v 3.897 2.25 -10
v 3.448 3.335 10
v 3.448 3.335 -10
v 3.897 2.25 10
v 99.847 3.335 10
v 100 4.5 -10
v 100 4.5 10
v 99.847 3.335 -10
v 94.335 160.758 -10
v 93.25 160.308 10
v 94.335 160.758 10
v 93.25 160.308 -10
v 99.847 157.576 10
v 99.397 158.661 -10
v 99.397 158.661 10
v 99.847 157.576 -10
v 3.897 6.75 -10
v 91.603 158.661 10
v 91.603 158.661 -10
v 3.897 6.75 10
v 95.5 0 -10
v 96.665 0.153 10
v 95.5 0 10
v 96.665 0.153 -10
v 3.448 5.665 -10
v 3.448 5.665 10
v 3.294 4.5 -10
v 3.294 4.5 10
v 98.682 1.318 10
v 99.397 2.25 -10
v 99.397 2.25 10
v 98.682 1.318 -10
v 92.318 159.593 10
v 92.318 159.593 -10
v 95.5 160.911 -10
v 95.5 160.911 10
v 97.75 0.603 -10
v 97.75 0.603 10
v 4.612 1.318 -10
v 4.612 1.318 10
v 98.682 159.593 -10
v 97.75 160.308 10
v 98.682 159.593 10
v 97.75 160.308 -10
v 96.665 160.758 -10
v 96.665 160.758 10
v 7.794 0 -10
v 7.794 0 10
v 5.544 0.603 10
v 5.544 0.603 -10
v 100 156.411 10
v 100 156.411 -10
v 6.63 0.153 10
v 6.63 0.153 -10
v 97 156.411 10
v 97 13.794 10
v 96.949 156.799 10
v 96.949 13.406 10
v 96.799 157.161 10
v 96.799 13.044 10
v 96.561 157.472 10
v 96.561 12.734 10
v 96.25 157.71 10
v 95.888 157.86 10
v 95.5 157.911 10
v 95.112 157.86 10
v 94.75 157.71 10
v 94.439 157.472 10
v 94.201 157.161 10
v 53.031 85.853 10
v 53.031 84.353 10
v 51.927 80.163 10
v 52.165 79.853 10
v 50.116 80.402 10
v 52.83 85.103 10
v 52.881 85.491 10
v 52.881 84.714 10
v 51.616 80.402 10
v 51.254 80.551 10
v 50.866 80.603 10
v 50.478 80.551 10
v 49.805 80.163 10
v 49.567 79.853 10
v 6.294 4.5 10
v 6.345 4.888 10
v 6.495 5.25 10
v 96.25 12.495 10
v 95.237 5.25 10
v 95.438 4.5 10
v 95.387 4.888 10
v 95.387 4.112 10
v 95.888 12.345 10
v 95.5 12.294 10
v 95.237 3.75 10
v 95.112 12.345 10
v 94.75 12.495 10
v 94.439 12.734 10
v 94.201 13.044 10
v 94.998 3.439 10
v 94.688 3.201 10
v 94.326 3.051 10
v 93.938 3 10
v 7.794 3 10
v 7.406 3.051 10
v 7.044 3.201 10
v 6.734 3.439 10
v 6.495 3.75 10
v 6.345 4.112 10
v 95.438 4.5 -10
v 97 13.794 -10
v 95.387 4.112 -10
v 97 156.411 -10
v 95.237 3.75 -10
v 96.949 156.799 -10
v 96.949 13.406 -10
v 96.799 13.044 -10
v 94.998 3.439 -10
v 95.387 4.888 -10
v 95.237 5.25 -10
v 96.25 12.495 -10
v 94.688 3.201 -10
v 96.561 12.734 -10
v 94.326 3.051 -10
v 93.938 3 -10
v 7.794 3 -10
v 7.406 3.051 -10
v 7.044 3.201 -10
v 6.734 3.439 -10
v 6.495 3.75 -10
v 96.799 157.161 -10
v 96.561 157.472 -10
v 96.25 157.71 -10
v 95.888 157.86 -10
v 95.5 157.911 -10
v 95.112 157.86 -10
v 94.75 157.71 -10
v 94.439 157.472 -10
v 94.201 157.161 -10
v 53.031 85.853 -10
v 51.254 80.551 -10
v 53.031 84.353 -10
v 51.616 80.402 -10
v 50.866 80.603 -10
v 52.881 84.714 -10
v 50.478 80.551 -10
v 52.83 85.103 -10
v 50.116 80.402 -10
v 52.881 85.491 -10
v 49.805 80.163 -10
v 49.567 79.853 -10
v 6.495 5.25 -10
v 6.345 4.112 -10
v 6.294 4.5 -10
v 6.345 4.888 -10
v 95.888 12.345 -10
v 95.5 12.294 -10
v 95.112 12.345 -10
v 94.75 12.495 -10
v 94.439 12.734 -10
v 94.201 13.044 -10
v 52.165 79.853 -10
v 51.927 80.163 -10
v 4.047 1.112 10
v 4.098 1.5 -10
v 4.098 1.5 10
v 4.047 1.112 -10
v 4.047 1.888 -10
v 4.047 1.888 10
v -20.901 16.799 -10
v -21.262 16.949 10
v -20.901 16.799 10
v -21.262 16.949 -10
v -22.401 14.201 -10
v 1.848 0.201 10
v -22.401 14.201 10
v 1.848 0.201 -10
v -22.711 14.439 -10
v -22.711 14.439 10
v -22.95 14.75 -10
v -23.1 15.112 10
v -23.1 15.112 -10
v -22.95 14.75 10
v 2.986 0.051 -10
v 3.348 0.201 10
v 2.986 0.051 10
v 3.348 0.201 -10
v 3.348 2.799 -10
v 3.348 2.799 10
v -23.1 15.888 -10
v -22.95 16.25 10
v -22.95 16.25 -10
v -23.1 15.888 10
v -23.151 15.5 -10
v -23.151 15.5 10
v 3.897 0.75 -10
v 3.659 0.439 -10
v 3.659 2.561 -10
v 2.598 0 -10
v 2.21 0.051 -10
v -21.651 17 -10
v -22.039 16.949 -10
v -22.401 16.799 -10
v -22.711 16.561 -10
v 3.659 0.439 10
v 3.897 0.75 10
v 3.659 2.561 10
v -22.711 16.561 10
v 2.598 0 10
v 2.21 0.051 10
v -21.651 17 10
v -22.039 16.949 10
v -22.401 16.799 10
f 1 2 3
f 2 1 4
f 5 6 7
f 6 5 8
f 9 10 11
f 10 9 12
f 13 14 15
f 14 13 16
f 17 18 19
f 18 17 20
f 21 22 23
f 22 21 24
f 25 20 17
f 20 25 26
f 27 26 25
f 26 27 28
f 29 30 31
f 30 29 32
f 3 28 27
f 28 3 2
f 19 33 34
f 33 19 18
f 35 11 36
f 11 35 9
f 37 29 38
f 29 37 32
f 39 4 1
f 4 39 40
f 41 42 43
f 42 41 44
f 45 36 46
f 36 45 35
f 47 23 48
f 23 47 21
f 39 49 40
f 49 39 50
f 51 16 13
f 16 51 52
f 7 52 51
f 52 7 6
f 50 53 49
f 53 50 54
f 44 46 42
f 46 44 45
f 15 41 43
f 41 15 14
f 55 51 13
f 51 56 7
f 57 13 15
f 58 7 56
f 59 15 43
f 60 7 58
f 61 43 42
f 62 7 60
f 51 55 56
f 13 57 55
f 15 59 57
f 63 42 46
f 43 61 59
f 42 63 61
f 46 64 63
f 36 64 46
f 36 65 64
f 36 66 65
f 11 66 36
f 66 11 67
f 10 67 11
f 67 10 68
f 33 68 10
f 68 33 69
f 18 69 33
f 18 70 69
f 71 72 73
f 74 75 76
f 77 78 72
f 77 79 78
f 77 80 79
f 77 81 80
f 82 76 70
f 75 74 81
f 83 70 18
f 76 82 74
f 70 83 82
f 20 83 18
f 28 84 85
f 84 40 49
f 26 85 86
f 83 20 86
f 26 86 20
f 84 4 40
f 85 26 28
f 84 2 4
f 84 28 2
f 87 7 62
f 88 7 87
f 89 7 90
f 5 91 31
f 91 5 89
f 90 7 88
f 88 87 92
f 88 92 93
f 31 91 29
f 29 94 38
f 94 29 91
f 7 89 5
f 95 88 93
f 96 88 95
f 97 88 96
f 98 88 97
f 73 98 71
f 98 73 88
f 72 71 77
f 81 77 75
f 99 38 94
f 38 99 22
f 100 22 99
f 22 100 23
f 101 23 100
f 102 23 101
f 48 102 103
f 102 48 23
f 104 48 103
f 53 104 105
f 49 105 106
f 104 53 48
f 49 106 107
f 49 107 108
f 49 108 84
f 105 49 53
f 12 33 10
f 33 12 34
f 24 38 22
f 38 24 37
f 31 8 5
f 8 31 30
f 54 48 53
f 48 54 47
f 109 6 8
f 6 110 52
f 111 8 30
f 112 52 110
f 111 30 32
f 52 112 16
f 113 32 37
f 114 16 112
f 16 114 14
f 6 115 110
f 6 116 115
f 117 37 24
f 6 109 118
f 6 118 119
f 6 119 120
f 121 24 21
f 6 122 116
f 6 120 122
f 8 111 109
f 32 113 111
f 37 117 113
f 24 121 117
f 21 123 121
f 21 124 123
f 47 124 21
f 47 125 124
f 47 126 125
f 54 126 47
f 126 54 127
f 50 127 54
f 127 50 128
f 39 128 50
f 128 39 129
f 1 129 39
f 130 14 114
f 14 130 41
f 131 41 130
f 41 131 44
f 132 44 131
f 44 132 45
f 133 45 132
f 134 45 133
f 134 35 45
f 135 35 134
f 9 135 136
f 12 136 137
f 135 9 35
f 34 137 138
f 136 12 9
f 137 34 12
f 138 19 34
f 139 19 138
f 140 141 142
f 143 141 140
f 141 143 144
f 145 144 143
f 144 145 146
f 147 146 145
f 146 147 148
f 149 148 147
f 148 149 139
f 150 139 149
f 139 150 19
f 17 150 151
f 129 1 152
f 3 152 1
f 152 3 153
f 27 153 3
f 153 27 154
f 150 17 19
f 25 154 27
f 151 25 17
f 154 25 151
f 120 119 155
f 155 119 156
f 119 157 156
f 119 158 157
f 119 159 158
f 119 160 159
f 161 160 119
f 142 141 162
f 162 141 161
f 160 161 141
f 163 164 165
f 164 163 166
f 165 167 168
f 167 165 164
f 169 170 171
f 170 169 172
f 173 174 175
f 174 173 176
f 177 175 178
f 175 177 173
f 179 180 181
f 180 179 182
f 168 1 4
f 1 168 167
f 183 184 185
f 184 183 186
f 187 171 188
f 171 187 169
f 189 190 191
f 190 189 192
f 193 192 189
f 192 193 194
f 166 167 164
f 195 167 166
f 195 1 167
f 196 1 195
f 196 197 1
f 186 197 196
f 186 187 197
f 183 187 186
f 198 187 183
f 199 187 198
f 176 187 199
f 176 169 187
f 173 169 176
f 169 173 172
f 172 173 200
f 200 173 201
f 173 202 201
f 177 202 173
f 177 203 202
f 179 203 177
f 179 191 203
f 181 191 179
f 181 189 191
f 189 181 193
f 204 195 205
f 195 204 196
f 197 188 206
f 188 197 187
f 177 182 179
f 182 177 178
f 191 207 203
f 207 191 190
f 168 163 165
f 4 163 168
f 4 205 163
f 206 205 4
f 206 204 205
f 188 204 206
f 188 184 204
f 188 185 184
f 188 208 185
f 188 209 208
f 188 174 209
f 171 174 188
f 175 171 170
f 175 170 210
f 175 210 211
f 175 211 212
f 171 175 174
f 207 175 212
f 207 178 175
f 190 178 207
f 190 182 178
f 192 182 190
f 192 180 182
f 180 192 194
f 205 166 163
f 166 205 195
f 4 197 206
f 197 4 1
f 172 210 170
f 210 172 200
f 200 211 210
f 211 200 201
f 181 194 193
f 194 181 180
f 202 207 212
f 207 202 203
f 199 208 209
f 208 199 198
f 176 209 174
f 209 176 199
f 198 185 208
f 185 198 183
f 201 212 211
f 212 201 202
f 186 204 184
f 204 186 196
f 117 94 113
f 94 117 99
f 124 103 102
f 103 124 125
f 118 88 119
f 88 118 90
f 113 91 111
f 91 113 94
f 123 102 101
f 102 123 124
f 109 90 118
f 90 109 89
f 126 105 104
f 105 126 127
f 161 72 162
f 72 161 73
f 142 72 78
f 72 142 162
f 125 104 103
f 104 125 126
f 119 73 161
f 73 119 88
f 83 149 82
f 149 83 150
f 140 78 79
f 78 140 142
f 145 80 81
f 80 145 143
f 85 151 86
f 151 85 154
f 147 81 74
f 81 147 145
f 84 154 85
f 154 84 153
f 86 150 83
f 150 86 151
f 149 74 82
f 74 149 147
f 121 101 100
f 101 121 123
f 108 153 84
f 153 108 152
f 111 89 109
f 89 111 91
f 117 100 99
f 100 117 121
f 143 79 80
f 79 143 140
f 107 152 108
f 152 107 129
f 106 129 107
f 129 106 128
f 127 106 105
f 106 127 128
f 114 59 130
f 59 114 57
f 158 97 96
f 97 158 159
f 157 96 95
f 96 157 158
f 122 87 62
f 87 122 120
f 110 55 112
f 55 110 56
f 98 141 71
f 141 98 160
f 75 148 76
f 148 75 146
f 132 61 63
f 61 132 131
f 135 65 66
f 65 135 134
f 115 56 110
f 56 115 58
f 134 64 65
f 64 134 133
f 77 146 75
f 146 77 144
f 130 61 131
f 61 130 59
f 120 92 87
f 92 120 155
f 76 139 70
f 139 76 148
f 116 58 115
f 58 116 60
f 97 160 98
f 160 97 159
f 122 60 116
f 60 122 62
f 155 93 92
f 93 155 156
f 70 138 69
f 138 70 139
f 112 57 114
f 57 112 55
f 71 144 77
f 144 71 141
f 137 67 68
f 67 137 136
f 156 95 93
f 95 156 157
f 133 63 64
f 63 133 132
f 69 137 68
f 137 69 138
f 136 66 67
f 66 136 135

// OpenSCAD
// Configurable laptop stand

// Copyright (C) 2017 Embecosm Limited (www.embecosm.com)

// Contributor: Jeremy Bennett <jeremy.bennett@embecosm.com>

// This file is licensed under the Creative Commons Attribution-ShareAlike 3.0
// Unported License. To view a copy of this license, visit
// http://creativecommons.org/licenses/by-sa/3.0/ or send a letter to Creative
// Commons, PO Box 1866, Mountain View, CA 94042, USA.


// General overlap value

DELTA  = 0.05;
DELTA2 = DELTA * 2;

// Measure the laptop thickness from the desk to the flat with the laptop
// open.

LAPTOP_T = 22;

// Thickness of the wall

T = 3.0;

// Degree of rounding of the inner edges

INNER_R = 1.5;

// Degree of rounding of the outer edges

OUTER_R = INNER_R + T;

// Angle of the stand, plus it opposite angle

A = 60.0;
B = 90.0 - A;

// Breadth of the stand, which since we are printing on our side is the height
// of the print.

H = 20;

// Length of the face.  This is the longest part of the stand, so limited by
// the printer.

F = 200.0;

// Other edges, base and back

BASE = F * cos (A);
BACK = F * sin (A);

// General
// -------

// Vertical lines are represented as vectors [TRUE, x_intercept]
// All other lines are represented as vectors [FALSE, m, c]
// Points are represented as vectors [x ,y, z]

// Note: We could more compactly represent vertical lines as scalars and use
//       vectors for all other lines, relying on len () which returns undef on
//       scalars to distinguish them. However our approach provides an element
//       of redundancy which can be helpful.


// Function to report if a line is vertical

function isvert (l) =
     l[0];


// Function to report if a line is horizontal

function ishoriz (l) =
     (!isvert (l)) && (l[1] == 0);


// Function to compute intersection of 2 lines, neither of which is vertical

//   y = m1 * x + c1
//   y = m2 * x + c2

// Equating the two we get

//   m1 * x + c1 = m2 * x + c2
//   (m1 - m2) * x = c2 - c1
//   x = (c2 - c1) / (m1 - m2)

//   y = m1 * (c2 - c1) / (m1 - m2) + c1

// We return a point [x, y], where x and y are both UNDEF if the lines are
// parallel.

function intersect1 (l1, l2) =
     let (m1 = l1[1], c1 = l1[2], m2 = l2[1], c2 = l2[2])
     (m1 == m2) ? [undef, undef, 0]
                : [(c2 - c1) / (m1 - m2), m1 * (c2 - c1) / (m1 - m2) + c1, 0];


// Function to computer intersection of 2 lines where one is vertical

//   y = m * x + c
//   x = k

// Equating the two we can solve for y

//   y = m * k + c

// Note that the second line is always the vertical one

// We return a pint [x, y, 0]

function intersect2 (l1, l2) =
     let (m = l1[1], c = l1[2], k = l2[1])
     [k, m * k + c, 0];


// Function to compute intersection of 2 lines, one of which may be vertical

// Returns a point [x,y], where x and y are both UNDEF if we are asked for the
// intersection of two vertical lines.

function intersect (l1, l2) =
     (isvert (l1) ? (isvert (l2) ? [undef, undef] : intersect2 (l2, l1))
                  : (isvert (l2) ? intersect2 (l1, l2) : intersect1 (l1, l2)));


// Function to compute the equation of a non-vertical parallel line

// Given y = m * x + c

// The line r above (below if r is negative) has the equation

//   y = m * x + c + r * sqrt (1 + m^2)

// We return the line [FALSE, m, c + r * sqrt (1 + m^2)]

function parallel_line1 (l, r) =
     let (m = l[1], c = l[2])
     [false, m, c + r * sqrt (1 + m * m)];


// Function to compute the equation of a vertical parallel line

// Given x = k

// The line r to the right left if r is negative) has the equation

//   x = k + r;

// We return the line [TRUE, k + r]

function parallel_line2 (l, r) =
     let (k = l[1])
     [true, k + r];


// Function to compute the equation of a parallel line

// This function works for vertical and non-vertical lines

// We return the parallel line

function parallel_line (l, r) =
     (isvert (l) ? parallel_line2 (l, r) : parallel_line1 (l, r));


// Function to compute a perpendicular line which passes through a point,
// where neither the original line, nor the resulting one are vertical.

// Let the originating line be:

//    y = m * x + c

// and the point of intersection be (x1, y1)

// The gradient of the resulting line, m' = -1/m
// The intercept, c' = y1 + x1 / m

// Return the resulting line [FALSE, m', c']

function perpendicular_line1 (l, p) =
     let (m = l[1], c = l[2], x1 = p[0], y1 = p [1])
     [false, -1 / m, y1 + x1 / m];


// Function to compute a perpendicular line which passes through a point where
// the original line is vertical.

// Let the originating line be:

//    x = k

// and the point of intersection be (x1, y1)

// The gradient of the resulting line, m' = 0
// The intercept, c' = y1

// Return the resulting line [FALSE, m', c']

function perpendicular_line2 (l, p) =
     let (y1 = p[1])
     [false, 0, y1];


// Function to compute a perpendicular line which passes through a point where
// the resulting line is vertical.

// Let the originating line be:

//    y = c

// and the point of intersection be (x1, y1)

// The x-intercept of the resulting line, k = x1

// Return the resulting line [TRUE, k]

function perpendicular_line3 (l, p) =
     let (x1 = p[0])
     [true, x1];


// Function to compute a perpendicular line which passes through a point

// We have to deal with the special cases where either the starting line or
// the resulting line may be vertical

// We return the resulting line

function perpendicular_line (l, p) =
     (isvert (l) ? perpendicular_line2 (l, p)
                 : (ishoriz (l) ? perpendicular_line3 (l, p)
                                : perpendicular_line1 (l, p)));


// Function to return the mid point between two points

// Return the resulting mid-point

function mid_point (p1, p2) =
     [(p1[0] + p2[0]) / 2, (p1[1] + p2[1]) / 2, (p1[2] + p2[2]) / 2];


// Function to return the non-vertical line which passes between two points.

// For now z is ignored.

// Return the resulting line

function join_line1 (p1, p2) =
     let (x1 = p1[0], x2 = p2[0], y1 = p1[1], y2 = p2[1],
	  m = (y2 - y1) / (x2 - x1), c = y1 - m * x1)
     [false, m, c];


// Function to return the vertical line which passes between two points.

// For now z is ignored.

// Return the resulting line

function join_line2 (p1, p2) =
     let (x1 = p1[0])
     [true, x1];


// Function to return the line which passes between two points.

// For now z is ignored. Split into vertical and non-vertical cases

// Return the resulting line

function join_line (p1, p2) =
     ((p1[0] != p2[0]) ? join_line1 (p1, p2) : join_line2 (p1, p2));


// The lines which outline the stand

//   Face:  y = tan (A) * x + 0  ([FALSE, tan (A), 0])
//   Base:  y = 0                ([FALSE, 0, 0])
//   Back:  x = F * cos (A)      ([TRUE, F * cos (A)])

face_line = [false, tan (A), 0];
base_line = [false, 0, 0];
back_line = [true, F * cos (A)];


// The diagonal goes from halfway along the face to the meeting point of the
// back and base.

mid_line = join_line (mid_point (intersect (back_line, face_line),
				 intersect (face_line, base_line)),
		      intersect (base_line, back_line));


// Block outline of main stand part.

// We use the intersections of OUTER_R inside the main outline:

//   Inside face by w:     y = tan (A) * x - w / cos A
//   Inside base by w:     y = w
//   Inside back by w:     x = F * cos (A) - w

// where w = OUTER_R

// We then add the lip, which is at right angles from the forward bottom
// corner.

module main_block () {
     w = OUTER_R;
     l1 = parallel_line (base_line, w);
     l2 = parallel_line (face_line, -w);
     l3 = parallel_line (back_line, -w);

     hull () {

	  // Main triangle

	  translate (v = intersect (l1, l2))
	       cylinder (r = w, h = H, center = true, $fn = 24);
	  translate (v = intersect (l2, l3))
	       cylinder (r = w, h = H, center = true, $fn = 24);
	  translate (v = intersect (l3, l1))
	       cylinder (r = w, h = H, center = true, $fn = 24);

	  // Lip
     }
}


// Lower hole

module lo_hole () {
     w1 = OUTER_R;
     w2 = INNER_R;
     h = H + DELTA;
     l1 = parallel_line (base_line, w1);
     l2 = parallel_line (face_line, -w1);
     l3 = parallel_line (mid_line,  -(T/2 + w2));
     hull () {
	  translate (v = intersect (l1, l2))
	       cylinder (r = w2, h = h, center = true, $fn = 24);
	  translate (v = intersect (l2, l3))
	       cylinder (r = w2, h = h, center = true, $fn = 24);
	  translate (v = intersect (l3, l1))
	       cylinder (r = w2, h = h, center = true, $fn = 24);
     }
}


// Upper hole

module hi_hole () {
     w1 = OUTER_R;
     w2 = INNER_R;
     h = H + DELTA;
     l1 = parallel_line (back_line, -w1);
     l2 = parallel_line (face_line, -w1);
     l3 = parallel_line (mid_line, T/2 + w2);
     hull () {
	  translate (v = intersect (l1, l2))
	       cylinder (r = w2, h = h, center = true, $fn = 24);
	  translate (v = intersect (l2, l3))
	       cylinder (r = w2, h = h, center = true, $fn = 24);
	  translate (v = intersect (l3, l1))
	       cylinder (r = w2, h = h, center = true, $fn = 24);
     }
}


// The lip

module lip () {
     w1 = T/2;
     w2 = LAPTOP_T + T;
     l1 = parallel_line (base_line, w1);
     l2 = parallel_line (face_line, -w1);
     l3 = perpendicular_line (face_line, intersect (l1, l2));
     l4 = parallel_line (face_line, w1 + w2);
     hull () {
	  translate (v = intersect (l1, l2))
	       cylinder (r = w1, h = H, center = true, $fn = 24);
	  translate (v = intersect (l3, l4))
	       cylinder (r = w1, h = H, center = true, $fn = 24);
     }
}


// The complete stand

module stand () {
     difference () {
	  union () {
	       main_block ();
	       lip ();
	  }
	  lo_hole ();
	  hi_hole ();
     }
}


echo ("mid point", mid_point (intersect (back_line, face_line),
			      intersect (face_line, base_line)))
echo (mid_line);
stand ();
